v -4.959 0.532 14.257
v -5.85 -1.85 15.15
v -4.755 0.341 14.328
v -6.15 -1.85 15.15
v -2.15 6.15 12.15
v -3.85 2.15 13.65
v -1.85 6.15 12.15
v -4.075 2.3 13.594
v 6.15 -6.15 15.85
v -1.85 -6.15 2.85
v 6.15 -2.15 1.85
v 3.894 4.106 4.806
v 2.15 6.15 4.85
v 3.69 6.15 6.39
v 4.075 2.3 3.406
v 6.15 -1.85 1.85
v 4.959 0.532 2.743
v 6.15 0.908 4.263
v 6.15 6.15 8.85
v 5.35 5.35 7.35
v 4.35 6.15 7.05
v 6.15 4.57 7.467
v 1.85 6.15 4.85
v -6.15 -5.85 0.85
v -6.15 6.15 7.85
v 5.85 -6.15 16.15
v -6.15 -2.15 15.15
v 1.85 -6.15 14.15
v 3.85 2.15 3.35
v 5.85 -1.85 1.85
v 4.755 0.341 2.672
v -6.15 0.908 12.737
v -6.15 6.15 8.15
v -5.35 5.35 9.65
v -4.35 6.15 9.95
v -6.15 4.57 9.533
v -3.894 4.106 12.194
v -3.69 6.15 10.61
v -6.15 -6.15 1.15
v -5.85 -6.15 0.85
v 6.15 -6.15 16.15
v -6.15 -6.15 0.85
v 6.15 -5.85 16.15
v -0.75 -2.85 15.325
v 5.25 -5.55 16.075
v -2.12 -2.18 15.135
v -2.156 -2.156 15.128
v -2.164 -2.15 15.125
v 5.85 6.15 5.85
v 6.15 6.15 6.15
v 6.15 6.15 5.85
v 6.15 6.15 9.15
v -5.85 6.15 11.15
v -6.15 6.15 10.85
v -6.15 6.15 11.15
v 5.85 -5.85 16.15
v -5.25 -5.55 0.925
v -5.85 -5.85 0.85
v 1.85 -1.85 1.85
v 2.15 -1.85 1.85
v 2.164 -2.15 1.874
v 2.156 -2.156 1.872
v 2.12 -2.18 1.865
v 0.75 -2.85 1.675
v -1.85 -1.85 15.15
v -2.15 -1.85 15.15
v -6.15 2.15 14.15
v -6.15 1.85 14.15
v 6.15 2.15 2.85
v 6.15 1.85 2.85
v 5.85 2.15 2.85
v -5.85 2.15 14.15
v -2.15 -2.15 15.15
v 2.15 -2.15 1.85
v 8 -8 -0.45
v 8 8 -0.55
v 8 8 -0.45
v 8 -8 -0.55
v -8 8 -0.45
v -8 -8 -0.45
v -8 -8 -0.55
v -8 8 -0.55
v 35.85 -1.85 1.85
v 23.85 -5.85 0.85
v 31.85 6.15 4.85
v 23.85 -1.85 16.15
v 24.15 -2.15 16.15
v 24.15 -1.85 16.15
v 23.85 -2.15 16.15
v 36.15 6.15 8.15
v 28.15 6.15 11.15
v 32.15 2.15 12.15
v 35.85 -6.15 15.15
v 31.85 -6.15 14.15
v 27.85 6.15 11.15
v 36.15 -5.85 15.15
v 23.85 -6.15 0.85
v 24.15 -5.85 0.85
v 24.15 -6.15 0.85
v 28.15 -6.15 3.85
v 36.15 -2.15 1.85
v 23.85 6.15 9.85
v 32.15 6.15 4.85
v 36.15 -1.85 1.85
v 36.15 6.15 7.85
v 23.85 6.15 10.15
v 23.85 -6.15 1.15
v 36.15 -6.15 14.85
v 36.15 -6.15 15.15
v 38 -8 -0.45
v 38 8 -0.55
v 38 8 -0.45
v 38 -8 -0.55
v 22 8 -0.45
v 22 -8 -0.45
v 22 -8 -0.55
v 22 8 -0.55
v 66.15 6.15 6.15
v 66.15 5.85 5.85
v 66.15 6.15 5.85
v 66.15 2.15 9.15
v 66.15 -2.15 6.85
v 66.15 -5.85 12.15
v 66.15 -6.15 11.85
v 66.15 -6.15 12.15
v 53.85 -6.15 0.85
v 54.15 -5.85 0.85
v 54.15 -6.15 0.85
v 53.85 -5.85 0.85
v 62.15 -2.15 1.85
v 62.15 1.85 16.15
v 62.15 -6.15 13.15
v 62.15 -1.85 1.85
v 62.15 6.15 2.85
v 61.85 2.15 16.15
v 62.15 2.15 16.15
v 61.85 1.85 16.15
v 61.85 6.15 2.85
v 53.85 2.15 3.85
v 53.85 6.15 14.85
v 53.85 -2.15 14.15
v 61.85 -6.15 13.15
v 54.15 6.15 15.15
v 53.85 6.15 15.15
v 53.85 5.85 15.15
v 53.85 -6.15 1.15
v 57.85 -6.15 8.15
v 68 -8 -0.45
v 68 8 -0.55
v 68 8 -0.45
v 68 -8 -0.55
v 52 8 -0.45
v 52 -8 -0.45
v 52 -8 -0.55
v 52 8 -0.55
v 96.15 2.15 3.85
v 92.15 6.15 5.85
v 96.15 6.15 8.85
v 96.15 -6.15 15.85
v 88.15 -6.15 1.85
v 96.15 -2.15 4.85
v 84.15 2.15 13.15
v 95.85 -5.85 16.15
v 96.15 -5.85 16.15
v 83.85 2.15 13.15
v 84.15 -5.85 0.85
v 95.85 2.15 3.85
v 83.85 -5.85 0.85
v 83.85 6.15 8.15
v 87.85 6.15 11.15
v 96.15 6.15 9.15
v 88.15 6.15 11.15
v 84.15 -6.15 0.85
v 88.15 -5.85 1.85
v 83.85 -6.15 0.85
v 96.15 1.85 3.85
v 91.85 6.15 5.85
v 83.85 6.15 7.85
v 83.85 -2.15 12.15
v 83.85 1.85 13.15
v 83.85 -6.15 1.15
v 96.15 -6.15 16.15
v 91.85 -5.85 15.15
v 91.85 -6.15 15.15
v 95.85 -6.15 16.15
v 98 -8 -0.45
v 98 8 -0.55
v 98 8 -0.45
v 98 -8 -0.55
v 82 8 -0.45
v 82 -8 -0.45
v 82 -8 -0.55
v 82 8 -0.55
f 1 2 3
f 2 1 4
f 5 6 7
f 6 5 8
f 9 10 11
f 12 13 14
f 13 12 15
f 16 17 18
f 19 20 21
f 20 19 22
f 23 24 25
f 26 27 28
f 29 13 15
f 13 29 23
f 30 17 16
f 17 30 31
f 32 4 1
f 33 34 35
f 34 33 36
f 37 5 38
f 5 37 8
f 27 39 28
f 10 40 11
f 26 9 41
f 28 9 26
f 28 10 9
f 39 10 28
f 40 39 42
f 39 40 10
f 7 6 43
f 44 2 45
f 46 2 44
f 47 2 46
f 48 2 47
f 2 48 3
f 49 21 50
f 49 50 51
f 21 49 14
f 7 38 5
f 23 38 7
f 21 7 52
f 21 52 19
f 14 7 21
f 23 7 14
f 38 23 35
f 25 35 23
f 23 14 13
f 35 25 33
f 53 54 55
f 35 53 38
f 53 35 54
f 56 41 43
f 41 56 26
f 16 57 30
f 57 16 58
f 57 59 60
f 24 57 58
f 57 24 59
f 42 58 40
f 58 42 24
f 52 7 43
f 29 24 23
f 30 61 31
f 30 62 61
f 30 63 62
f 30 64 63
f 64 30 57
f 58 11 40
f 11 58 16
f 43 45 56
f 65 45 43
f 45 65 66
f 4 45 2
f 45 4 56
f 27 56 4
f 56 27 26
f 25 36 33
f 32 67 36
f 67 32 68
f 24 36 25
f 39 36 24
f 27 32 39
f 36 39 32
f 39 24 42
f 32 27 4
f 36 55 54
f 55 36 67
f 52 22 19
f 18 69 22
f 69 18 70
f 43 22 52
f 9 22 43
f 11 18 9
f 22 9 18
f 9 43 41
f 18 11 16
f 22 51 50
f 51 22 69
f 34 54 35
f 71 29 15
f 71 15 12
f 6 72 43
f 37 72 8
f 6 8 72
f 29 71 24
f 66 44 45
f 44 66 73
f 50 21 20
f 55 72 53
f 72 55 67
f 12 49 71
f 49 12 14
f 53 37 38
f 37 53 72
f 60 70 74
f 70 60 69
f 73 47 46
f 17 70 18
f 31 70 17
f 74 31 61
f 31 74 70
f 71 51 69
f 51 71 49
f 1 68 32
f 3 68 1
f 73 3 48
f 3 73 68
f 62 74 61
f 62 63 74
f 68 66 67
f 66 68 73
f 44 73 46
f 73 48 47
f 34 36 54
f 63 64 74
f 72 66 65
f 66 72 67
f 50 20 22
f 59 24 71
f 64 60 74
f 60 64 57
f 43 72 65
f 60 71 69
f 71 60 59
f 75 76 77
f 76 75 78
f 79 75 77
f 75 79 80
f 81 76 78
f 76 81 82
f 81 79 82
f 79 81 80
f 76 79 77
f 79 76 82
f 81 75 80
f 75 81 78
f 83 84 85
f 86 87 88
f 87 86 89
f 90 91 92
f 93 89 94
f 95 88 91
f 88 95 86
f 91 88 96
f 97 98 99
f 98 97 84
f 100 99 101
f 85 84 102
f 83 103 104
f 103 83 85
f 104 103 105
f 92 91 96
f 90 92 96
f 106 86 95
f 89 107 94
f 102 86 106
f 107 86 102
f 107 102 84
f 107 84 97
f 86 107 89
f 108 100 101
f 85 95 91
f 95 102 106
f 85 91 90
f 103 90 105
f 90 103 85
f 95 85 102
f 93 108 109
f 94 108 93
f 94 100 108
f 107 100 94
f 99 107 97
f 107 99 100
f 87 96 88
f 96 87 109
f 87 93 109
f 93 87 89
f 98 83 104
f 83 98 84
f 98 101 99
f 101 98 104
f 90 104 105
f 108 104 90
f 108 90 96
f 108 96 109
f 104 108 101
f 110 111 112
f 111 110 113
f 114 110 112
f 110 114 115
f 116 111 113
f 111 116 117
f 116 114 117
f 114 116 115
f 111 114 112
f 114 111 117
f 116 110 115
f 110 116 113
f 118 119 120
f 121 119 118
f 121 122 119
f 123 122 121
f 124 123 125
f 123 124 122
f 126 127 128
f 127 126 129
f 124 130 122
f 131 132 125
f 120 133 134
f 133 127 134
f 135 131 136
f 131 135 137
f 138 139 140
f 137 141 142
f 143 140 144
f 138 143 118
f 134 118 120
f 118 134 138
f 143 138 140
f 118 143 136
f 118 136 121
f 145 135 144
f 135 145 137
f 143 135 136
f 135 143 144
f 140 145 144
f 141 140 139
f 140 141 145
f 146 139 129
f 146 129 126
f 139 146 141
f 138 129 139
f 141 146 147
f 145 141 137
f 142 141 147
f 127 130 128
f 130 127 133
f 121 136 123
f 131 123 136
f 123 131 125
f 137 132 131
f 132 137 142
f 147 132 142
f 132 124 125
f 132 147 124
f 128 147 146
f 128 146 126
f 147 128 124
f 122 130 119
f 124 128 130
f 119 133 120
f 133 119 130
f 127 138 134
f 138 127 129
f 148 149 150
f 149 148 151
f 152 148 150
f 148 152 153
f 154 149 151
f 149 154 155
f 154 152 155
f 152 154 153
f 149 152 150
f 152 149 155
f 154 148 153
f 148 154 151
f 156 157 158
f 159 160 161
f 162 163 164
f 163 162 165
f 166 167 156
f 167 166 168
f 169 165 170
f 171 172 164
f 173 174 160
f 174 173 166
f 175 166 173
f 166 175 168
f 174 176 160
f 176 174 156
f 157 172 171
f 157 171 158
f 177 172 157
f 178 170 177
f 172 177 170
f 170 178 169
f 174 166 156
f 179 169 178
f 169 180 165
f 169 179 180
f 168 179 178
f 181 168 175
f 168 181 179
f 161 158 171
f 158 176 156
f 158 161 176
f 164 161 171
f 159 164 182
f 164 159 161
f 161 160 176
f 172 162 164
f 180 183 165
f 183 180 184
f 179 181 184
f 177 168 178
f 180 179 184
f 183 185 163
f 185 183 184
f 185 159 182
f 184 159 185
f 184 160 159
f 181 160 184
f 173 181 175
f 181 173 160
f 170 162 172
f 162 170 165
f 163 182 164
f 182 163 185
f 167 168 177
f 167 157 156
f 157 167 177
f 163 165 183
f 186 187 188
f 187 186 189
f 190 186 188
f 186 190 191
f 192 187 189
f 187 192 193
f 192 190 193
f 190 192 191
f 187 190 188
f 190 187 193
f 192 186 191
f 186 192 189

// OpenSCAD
// Magic Square Gem Comparison
// This script shows multiple magic square gems side by side to compare their geometric properties

// Include the magicGem.scad file
include <magicGem.scad>

// Override parameters for better visualization
$fn = 8; // Reduced resolution for faster rendering
point_size = 0.6; // Size of points in the embedding
edge_size = 0.3; // Size of hull vertices
hull_opacity = 0.15; // Opacity of the convex hull faces
show_points = false; // Show points
show_hull = true; // Show hull
scale_factor = 4; // Scale factor for the embedding
vertical_scale = 0.25; // Vertical scale factor to flatten the shape
base_spacing = 30; // Increased spacing between gems to prevent overlap

// Define interesting magic squares to compare
interesting_squares = [
    // Maximum vertices (16) - Most spread out pattern
    [
        [1, 4, 13, 16],
        [8, 15, 2, 9],
        [14, 5, 12, 3],
        [11, 10, 7, 6]
    ],
    // Minimum vertices (11) - Most compact pattern
    [
        [1, 4, 14, 15],
        [16, 13, 3, 2],
        [7, 6, 12, 9],
        [10, 11, 5, 8]
    ],
    // Balanced vertices (13) with diagonal flow
    [
        [1, 8, 13, 12],
        [14, 11, 2, 7],
        [4, 5, 16, 9],
        [15, 10, 3, 6]
    ],
    // Spiral pattern with continuous growth
    [
        [1, 2, 15, 16],
        [12, 14, 3, 5],
        [13, 7, 10, 4],
        [8, 11, 6, 9]
    ]
];

// Define descriptions for each gem
descriptions = [
    ["Maximum Spread", 
     "16 hull vertices",
     "No face/interior points",
     "Most extreme geometry"],
    
    ["Most Compact",
     "11 hull vertices",
     "3 face, 2 interior points",
     "Balanced distribution"],
    
    ["Diagonal Flow",
     "13 hull vertices",
     "Smooth transitions",
     "Balanced complexity"],
    
    ["Spiral Growth",
     "12 hull vertices",
     "Organic form",
     "Continuous flow"]
];

// Create all gems in a single hull operation for better performance
module all_gems() {
    for (i = [0:3]) {
        translate([i * base_spacing, 0, 0]) {
            // Add a small platform under each gem for better separation
            color([0.9, 0.9, 0.9, 0.1])
                translate([0, 0, -0.5])
                    cube([scale_factor * 4, scale_factor * 4, 0.1], center=true);
            // Create the gem
            magic_square_gem(interesting_squares[i]);
        }
    }
}

// Create labels in a separate operation
module all_labels() {
    for (i = [0:3]) {
        translate([i * base_spacing, -8, 0]) {
            // Magic sum
            color([0.3, 0.3, 0.3])
                linear_extrude(height=0.5)
                    text(str("Sum: ", interesting_squares[i][0][0] + 
                                    interesting_squares[i][0][1] + 
                                    interesting_squares[i][0][2] + 
                                    interesting_squares[i][0][3]), 
                         size=1.2, halign="center");
            
            // Shape properties (4 lines of description)
            for (j = [0:3]) {
                translate([0, -2.5 - j * 2, 0])
                    color([0.3, 0.3, 0.3])
                        linear_extrude(height=0.5)
                            text(descriptions[i][j], 
                                 size=1, halign="center");
            }
        }
    }
}

// Display everything
union() {
    all_gems();
    // all_labels();
    
    // // Add title
    // color([0.3, 0.3, 0.3])
    // translate([base_spacing * 1.5, 12, 0])
    //     linear_extrude(height=0.5)
    //         text("Magic Square Gem Comparison", size=2, halign="center");
}

/* 
 * This comparison shows four magic squares with maximally different geometric properties:
 * 
 * 1. Maximum Spread (16 vertices):
 *    - All points are hull vertices
 *    - No face or interior points
 *    - Creates the most extreme geometric form
 *    - Maximum possible convex hull volume
 * 
 * 2. Most Compact (11 vertices):
 *    - Minimum number of hull vertices
 *    - Balanced distribution of face and interior points
 *    - Most efficient space utilization
 *    - Minimum convex hull volume
 * 
 * 3. Diagonal Flow (13 vertices):
 *    - Intermediate number of hull vertices
 *    - Values progress along diagonals
 *    - Creates smooth geometric transitions
 *    - Balanced between extremes
 * 
 * 4. Spiral Pattern (12 vertices):
 *    - Organic geometric form
 *    - Values spiral from center outward
 *    - Creates helical surface structure
 *    - Continuous growth pattern
 * 
 * These squares were chosen to maximize geometric diversity based on:
 * - Number of hull vertices (ranging from 11 to 16)
 * - Distribution of face and interior points
 * - Overall geometric form and symmetry
 * - Pattern of value progression
 */ 
